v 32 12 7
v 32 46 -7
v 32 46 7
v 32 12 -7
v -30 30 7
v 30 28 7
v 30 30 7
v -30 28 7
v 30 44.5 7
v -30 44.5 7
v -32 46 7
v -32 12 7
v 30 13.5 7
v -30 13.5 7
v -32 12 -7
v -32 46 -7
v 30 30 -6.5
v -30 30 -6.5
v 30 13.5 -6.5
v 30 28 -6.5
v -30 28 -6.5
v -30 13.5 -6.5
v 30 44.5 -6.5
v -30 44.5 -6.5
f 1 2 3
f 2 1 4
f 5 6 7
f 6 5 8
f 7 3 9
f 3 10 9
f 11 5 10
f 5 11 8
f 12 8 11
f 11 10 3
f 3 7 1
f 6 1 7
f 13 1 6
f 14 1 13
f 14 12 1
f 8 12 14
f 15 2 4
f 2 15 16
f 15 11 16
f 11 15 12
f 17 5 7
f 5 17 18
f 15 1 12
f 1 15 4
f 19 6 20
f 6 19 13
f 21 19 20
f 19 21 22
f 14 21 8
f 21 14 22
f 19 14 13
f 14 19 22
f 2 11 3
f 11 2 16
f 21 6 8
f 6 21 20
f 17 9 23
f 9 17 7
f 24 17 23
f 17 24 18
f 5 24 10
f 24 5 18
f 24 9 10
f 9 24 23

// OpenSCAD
/*
*******************************************
Objekt Info: AA Batterie Box einfach/zweifach

*******************************************
Version: 11.07.2023 khf
*******************************************
*/

//***************   Auswahl   *************

        //Auswahl 1x Case oder 2x Case
        part="case2"; // case1, case2

//***************   Libraries  ************

//keine

//*****************************************

//***************  Parameter   *************
$fn=60;
//*****************************************

//**************   Programm  **************

//-----------------------------------
module case1(){
//Case 1x
 union(){
difference()
translate(v = [0, 21, 0])
difference(){
cube(size = [64,18,14], center = true);
translate(v = [0, 0, 1])
cube(size = [60,15,15], center = true);
}
}
}
//-----------------------------------

//-----------------------------------
module case2(){
//Case 1
 union(){
difference()
translate(v = [0, 21, 0])
difference(){
cube(size = [64,18,14], center = true);
translate(v = [0, 0, 1])
cube(size = [60,15,15], center = true);
}

}

//Case 2

difference()
translate(v = [0, 37, 0])
difference(){
cube(size = [64,18,14], center = true);
translate(v = [0, 0, 1])
cube(size = [60,15,15], center = true);
}
}
//-----------------------------------

//Part:

  if(part=="case1")
    case1();
  else if(part=="case2")
    case2();
